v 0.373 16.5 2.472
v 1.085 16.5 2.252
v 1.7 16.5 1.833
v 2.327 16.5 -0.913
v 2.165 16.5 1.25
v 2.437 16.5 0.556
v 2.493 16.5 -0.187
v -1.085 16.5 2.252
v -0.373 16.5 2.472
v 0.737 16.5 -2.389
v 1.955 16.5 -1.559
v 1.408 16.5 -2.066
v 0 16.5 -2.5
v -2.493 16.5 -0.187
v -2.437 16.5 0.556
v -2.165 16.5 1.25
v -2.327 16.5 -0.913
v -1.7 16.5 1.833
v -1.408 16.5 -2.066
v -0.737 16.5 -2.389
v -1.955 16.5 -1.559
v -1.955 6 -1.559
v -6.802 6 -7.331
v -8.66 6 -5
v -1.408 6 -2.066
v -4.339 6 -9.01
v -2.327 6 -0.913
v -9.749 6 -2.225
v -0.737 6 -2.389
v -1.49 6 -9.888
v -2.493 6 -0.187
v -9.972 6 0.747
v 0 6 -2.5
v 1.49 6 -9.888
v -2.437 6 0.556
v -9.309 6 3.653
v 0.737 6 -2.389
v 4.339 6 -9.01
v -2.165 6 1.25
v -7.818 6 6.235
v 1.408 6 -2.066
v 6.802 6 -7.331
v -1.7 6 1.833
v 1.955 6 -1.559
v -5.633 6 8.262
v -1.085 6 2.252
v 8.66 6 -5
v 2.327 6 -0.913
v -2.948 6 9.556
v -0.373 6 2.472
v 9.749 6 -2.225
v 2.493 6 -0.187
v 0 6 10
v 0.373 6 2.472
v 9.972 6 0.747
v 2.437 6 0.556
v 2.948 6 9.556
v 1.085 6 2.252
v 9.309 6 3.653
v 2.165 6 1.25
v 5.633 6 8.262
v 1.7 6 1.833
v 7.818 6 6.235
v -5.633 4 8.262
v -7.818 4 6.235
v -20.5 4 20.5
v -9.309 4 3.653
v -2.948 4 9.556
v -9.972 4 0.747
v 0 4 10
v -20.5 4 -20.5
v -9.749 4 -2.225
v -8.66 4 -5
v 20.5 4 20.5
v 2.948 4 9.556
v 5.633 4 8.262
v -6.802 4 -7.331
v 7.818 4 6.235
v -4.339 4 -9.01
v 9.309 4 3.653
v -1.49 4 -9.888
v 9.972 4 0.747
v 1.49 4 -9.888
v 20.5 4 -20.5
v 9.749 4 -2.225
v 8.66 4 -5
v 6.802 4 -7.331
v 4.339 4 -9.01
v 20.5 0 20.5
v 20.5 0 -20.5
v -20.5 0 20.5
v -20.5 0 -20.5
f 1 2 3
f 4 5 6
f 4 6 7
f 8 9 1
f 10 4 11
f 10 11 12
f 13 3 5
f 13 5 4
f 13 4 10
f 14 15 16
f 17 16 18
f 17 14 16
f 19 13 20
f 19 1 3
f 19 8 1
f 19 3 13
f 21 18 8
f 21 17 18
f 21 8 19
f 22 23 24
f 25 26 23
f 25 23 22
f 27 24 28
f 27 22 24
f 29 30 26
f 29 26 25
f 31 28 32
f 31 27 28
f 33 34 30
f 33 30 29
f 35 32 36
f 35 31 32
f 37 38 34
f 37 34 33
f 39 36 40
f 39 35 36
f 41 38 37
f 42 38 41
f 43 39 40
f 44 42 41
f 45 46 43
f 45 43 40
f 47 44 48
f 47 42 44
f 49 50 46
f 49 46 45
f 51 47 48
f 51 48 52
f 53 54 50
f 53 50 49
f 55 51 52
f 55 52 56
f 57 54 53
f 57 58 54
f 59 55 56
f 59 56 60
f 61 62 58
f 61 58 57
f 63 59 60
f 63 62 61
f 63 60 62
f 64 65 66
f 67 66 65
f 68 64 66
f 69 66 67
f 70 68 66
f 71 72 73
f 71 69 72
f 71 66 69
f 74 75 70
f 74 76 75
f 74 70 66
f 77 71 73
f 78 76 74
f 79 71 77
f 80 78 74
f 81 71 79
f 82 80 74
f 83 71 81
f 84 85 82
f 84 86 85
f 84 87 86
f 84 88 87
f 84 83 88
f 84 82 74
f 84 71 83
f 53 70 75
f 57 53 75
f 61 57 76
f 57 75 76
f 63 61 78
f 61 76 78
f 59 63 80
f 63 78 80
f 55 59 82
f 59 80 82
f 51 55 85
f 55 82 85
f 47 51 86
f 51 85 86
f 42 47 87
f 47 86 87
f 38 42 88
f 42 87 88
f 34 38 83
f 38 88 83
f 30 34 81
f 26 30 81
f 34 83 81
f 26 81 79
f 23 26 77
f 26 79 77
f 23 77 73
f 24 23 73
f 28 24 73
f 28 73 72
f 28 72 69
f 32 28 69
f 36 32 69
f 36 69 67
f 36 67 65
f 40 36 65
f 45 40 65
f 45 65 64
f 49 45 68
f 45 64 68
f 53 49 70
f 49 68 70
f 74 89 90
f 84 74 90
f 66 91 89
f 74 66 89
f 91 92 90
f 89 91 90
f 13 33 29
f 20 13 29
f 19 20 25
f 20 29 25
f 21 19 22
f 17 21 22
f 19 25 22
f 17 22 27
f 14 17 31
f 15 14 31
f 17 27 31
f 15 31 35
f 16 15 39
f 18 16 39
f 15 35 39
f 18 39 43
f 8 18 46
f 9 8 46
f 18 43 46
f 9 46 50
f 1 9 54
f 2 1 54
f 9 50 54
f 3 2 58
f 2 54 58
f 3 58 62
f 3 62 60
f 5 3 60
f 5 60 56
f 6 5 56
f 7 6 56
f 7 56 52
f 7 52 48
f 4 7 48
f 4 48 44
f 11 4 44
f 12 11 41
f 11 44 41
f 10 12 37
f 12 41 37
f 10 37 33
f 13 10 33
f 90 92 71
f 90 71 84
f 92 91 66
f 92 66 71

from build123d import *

# Parameters (mm, degrees)
SKETCH_1_W      = 41
SKETCH_1_H      = 41
EXTRUDE_1_DEPTH = 4
SKETCH_2_R      = 10
EXTRUDE_2_DEPTH = 2
SKETCH_3_R      = 2.5
EXTRUDE_3_DEPTH = 10.5


with BuildPart() as part:
    # 草图1 → 凸台-拉伸1 (new body)
    with BuildSketch(Plane(origin=(0, 0, 0), x_dir=(1, 0, 0), z_dir=(0, 1, 0))):
        Rectangle(SKETCH_1_W, SKETCH_1_H)
    extrude(amount=EXTRUDE_1_DEPTH)

    # 草图2 → 凸台-拉伸2 (add)
    with BuildSketch(Plane(origin=(0, 4, 0), x_dir=(1, 0, 0), z_dir=(0, 1, 0))):
        with Locations(Location((0, 0, 0), (0, 0, 270))):
            Circle(SKETCH_2_R)
    extrude(amount=EXTRUDE_2_DEPTH)

    # 草图3 → 凸台-拉伸3 (add)
    with BuildSketch(Plane(origin=(0, 6, 0), x_dir=(1, 0, 0), z_dir=(0, 1, 0))):
        with Locations(Location((0, 0, 0), (0, 0, 90))):
            Circle(SKETCH_3_R)
    extrude(amount=EXTRUDE_3_DEPTH)


solid = part.part
